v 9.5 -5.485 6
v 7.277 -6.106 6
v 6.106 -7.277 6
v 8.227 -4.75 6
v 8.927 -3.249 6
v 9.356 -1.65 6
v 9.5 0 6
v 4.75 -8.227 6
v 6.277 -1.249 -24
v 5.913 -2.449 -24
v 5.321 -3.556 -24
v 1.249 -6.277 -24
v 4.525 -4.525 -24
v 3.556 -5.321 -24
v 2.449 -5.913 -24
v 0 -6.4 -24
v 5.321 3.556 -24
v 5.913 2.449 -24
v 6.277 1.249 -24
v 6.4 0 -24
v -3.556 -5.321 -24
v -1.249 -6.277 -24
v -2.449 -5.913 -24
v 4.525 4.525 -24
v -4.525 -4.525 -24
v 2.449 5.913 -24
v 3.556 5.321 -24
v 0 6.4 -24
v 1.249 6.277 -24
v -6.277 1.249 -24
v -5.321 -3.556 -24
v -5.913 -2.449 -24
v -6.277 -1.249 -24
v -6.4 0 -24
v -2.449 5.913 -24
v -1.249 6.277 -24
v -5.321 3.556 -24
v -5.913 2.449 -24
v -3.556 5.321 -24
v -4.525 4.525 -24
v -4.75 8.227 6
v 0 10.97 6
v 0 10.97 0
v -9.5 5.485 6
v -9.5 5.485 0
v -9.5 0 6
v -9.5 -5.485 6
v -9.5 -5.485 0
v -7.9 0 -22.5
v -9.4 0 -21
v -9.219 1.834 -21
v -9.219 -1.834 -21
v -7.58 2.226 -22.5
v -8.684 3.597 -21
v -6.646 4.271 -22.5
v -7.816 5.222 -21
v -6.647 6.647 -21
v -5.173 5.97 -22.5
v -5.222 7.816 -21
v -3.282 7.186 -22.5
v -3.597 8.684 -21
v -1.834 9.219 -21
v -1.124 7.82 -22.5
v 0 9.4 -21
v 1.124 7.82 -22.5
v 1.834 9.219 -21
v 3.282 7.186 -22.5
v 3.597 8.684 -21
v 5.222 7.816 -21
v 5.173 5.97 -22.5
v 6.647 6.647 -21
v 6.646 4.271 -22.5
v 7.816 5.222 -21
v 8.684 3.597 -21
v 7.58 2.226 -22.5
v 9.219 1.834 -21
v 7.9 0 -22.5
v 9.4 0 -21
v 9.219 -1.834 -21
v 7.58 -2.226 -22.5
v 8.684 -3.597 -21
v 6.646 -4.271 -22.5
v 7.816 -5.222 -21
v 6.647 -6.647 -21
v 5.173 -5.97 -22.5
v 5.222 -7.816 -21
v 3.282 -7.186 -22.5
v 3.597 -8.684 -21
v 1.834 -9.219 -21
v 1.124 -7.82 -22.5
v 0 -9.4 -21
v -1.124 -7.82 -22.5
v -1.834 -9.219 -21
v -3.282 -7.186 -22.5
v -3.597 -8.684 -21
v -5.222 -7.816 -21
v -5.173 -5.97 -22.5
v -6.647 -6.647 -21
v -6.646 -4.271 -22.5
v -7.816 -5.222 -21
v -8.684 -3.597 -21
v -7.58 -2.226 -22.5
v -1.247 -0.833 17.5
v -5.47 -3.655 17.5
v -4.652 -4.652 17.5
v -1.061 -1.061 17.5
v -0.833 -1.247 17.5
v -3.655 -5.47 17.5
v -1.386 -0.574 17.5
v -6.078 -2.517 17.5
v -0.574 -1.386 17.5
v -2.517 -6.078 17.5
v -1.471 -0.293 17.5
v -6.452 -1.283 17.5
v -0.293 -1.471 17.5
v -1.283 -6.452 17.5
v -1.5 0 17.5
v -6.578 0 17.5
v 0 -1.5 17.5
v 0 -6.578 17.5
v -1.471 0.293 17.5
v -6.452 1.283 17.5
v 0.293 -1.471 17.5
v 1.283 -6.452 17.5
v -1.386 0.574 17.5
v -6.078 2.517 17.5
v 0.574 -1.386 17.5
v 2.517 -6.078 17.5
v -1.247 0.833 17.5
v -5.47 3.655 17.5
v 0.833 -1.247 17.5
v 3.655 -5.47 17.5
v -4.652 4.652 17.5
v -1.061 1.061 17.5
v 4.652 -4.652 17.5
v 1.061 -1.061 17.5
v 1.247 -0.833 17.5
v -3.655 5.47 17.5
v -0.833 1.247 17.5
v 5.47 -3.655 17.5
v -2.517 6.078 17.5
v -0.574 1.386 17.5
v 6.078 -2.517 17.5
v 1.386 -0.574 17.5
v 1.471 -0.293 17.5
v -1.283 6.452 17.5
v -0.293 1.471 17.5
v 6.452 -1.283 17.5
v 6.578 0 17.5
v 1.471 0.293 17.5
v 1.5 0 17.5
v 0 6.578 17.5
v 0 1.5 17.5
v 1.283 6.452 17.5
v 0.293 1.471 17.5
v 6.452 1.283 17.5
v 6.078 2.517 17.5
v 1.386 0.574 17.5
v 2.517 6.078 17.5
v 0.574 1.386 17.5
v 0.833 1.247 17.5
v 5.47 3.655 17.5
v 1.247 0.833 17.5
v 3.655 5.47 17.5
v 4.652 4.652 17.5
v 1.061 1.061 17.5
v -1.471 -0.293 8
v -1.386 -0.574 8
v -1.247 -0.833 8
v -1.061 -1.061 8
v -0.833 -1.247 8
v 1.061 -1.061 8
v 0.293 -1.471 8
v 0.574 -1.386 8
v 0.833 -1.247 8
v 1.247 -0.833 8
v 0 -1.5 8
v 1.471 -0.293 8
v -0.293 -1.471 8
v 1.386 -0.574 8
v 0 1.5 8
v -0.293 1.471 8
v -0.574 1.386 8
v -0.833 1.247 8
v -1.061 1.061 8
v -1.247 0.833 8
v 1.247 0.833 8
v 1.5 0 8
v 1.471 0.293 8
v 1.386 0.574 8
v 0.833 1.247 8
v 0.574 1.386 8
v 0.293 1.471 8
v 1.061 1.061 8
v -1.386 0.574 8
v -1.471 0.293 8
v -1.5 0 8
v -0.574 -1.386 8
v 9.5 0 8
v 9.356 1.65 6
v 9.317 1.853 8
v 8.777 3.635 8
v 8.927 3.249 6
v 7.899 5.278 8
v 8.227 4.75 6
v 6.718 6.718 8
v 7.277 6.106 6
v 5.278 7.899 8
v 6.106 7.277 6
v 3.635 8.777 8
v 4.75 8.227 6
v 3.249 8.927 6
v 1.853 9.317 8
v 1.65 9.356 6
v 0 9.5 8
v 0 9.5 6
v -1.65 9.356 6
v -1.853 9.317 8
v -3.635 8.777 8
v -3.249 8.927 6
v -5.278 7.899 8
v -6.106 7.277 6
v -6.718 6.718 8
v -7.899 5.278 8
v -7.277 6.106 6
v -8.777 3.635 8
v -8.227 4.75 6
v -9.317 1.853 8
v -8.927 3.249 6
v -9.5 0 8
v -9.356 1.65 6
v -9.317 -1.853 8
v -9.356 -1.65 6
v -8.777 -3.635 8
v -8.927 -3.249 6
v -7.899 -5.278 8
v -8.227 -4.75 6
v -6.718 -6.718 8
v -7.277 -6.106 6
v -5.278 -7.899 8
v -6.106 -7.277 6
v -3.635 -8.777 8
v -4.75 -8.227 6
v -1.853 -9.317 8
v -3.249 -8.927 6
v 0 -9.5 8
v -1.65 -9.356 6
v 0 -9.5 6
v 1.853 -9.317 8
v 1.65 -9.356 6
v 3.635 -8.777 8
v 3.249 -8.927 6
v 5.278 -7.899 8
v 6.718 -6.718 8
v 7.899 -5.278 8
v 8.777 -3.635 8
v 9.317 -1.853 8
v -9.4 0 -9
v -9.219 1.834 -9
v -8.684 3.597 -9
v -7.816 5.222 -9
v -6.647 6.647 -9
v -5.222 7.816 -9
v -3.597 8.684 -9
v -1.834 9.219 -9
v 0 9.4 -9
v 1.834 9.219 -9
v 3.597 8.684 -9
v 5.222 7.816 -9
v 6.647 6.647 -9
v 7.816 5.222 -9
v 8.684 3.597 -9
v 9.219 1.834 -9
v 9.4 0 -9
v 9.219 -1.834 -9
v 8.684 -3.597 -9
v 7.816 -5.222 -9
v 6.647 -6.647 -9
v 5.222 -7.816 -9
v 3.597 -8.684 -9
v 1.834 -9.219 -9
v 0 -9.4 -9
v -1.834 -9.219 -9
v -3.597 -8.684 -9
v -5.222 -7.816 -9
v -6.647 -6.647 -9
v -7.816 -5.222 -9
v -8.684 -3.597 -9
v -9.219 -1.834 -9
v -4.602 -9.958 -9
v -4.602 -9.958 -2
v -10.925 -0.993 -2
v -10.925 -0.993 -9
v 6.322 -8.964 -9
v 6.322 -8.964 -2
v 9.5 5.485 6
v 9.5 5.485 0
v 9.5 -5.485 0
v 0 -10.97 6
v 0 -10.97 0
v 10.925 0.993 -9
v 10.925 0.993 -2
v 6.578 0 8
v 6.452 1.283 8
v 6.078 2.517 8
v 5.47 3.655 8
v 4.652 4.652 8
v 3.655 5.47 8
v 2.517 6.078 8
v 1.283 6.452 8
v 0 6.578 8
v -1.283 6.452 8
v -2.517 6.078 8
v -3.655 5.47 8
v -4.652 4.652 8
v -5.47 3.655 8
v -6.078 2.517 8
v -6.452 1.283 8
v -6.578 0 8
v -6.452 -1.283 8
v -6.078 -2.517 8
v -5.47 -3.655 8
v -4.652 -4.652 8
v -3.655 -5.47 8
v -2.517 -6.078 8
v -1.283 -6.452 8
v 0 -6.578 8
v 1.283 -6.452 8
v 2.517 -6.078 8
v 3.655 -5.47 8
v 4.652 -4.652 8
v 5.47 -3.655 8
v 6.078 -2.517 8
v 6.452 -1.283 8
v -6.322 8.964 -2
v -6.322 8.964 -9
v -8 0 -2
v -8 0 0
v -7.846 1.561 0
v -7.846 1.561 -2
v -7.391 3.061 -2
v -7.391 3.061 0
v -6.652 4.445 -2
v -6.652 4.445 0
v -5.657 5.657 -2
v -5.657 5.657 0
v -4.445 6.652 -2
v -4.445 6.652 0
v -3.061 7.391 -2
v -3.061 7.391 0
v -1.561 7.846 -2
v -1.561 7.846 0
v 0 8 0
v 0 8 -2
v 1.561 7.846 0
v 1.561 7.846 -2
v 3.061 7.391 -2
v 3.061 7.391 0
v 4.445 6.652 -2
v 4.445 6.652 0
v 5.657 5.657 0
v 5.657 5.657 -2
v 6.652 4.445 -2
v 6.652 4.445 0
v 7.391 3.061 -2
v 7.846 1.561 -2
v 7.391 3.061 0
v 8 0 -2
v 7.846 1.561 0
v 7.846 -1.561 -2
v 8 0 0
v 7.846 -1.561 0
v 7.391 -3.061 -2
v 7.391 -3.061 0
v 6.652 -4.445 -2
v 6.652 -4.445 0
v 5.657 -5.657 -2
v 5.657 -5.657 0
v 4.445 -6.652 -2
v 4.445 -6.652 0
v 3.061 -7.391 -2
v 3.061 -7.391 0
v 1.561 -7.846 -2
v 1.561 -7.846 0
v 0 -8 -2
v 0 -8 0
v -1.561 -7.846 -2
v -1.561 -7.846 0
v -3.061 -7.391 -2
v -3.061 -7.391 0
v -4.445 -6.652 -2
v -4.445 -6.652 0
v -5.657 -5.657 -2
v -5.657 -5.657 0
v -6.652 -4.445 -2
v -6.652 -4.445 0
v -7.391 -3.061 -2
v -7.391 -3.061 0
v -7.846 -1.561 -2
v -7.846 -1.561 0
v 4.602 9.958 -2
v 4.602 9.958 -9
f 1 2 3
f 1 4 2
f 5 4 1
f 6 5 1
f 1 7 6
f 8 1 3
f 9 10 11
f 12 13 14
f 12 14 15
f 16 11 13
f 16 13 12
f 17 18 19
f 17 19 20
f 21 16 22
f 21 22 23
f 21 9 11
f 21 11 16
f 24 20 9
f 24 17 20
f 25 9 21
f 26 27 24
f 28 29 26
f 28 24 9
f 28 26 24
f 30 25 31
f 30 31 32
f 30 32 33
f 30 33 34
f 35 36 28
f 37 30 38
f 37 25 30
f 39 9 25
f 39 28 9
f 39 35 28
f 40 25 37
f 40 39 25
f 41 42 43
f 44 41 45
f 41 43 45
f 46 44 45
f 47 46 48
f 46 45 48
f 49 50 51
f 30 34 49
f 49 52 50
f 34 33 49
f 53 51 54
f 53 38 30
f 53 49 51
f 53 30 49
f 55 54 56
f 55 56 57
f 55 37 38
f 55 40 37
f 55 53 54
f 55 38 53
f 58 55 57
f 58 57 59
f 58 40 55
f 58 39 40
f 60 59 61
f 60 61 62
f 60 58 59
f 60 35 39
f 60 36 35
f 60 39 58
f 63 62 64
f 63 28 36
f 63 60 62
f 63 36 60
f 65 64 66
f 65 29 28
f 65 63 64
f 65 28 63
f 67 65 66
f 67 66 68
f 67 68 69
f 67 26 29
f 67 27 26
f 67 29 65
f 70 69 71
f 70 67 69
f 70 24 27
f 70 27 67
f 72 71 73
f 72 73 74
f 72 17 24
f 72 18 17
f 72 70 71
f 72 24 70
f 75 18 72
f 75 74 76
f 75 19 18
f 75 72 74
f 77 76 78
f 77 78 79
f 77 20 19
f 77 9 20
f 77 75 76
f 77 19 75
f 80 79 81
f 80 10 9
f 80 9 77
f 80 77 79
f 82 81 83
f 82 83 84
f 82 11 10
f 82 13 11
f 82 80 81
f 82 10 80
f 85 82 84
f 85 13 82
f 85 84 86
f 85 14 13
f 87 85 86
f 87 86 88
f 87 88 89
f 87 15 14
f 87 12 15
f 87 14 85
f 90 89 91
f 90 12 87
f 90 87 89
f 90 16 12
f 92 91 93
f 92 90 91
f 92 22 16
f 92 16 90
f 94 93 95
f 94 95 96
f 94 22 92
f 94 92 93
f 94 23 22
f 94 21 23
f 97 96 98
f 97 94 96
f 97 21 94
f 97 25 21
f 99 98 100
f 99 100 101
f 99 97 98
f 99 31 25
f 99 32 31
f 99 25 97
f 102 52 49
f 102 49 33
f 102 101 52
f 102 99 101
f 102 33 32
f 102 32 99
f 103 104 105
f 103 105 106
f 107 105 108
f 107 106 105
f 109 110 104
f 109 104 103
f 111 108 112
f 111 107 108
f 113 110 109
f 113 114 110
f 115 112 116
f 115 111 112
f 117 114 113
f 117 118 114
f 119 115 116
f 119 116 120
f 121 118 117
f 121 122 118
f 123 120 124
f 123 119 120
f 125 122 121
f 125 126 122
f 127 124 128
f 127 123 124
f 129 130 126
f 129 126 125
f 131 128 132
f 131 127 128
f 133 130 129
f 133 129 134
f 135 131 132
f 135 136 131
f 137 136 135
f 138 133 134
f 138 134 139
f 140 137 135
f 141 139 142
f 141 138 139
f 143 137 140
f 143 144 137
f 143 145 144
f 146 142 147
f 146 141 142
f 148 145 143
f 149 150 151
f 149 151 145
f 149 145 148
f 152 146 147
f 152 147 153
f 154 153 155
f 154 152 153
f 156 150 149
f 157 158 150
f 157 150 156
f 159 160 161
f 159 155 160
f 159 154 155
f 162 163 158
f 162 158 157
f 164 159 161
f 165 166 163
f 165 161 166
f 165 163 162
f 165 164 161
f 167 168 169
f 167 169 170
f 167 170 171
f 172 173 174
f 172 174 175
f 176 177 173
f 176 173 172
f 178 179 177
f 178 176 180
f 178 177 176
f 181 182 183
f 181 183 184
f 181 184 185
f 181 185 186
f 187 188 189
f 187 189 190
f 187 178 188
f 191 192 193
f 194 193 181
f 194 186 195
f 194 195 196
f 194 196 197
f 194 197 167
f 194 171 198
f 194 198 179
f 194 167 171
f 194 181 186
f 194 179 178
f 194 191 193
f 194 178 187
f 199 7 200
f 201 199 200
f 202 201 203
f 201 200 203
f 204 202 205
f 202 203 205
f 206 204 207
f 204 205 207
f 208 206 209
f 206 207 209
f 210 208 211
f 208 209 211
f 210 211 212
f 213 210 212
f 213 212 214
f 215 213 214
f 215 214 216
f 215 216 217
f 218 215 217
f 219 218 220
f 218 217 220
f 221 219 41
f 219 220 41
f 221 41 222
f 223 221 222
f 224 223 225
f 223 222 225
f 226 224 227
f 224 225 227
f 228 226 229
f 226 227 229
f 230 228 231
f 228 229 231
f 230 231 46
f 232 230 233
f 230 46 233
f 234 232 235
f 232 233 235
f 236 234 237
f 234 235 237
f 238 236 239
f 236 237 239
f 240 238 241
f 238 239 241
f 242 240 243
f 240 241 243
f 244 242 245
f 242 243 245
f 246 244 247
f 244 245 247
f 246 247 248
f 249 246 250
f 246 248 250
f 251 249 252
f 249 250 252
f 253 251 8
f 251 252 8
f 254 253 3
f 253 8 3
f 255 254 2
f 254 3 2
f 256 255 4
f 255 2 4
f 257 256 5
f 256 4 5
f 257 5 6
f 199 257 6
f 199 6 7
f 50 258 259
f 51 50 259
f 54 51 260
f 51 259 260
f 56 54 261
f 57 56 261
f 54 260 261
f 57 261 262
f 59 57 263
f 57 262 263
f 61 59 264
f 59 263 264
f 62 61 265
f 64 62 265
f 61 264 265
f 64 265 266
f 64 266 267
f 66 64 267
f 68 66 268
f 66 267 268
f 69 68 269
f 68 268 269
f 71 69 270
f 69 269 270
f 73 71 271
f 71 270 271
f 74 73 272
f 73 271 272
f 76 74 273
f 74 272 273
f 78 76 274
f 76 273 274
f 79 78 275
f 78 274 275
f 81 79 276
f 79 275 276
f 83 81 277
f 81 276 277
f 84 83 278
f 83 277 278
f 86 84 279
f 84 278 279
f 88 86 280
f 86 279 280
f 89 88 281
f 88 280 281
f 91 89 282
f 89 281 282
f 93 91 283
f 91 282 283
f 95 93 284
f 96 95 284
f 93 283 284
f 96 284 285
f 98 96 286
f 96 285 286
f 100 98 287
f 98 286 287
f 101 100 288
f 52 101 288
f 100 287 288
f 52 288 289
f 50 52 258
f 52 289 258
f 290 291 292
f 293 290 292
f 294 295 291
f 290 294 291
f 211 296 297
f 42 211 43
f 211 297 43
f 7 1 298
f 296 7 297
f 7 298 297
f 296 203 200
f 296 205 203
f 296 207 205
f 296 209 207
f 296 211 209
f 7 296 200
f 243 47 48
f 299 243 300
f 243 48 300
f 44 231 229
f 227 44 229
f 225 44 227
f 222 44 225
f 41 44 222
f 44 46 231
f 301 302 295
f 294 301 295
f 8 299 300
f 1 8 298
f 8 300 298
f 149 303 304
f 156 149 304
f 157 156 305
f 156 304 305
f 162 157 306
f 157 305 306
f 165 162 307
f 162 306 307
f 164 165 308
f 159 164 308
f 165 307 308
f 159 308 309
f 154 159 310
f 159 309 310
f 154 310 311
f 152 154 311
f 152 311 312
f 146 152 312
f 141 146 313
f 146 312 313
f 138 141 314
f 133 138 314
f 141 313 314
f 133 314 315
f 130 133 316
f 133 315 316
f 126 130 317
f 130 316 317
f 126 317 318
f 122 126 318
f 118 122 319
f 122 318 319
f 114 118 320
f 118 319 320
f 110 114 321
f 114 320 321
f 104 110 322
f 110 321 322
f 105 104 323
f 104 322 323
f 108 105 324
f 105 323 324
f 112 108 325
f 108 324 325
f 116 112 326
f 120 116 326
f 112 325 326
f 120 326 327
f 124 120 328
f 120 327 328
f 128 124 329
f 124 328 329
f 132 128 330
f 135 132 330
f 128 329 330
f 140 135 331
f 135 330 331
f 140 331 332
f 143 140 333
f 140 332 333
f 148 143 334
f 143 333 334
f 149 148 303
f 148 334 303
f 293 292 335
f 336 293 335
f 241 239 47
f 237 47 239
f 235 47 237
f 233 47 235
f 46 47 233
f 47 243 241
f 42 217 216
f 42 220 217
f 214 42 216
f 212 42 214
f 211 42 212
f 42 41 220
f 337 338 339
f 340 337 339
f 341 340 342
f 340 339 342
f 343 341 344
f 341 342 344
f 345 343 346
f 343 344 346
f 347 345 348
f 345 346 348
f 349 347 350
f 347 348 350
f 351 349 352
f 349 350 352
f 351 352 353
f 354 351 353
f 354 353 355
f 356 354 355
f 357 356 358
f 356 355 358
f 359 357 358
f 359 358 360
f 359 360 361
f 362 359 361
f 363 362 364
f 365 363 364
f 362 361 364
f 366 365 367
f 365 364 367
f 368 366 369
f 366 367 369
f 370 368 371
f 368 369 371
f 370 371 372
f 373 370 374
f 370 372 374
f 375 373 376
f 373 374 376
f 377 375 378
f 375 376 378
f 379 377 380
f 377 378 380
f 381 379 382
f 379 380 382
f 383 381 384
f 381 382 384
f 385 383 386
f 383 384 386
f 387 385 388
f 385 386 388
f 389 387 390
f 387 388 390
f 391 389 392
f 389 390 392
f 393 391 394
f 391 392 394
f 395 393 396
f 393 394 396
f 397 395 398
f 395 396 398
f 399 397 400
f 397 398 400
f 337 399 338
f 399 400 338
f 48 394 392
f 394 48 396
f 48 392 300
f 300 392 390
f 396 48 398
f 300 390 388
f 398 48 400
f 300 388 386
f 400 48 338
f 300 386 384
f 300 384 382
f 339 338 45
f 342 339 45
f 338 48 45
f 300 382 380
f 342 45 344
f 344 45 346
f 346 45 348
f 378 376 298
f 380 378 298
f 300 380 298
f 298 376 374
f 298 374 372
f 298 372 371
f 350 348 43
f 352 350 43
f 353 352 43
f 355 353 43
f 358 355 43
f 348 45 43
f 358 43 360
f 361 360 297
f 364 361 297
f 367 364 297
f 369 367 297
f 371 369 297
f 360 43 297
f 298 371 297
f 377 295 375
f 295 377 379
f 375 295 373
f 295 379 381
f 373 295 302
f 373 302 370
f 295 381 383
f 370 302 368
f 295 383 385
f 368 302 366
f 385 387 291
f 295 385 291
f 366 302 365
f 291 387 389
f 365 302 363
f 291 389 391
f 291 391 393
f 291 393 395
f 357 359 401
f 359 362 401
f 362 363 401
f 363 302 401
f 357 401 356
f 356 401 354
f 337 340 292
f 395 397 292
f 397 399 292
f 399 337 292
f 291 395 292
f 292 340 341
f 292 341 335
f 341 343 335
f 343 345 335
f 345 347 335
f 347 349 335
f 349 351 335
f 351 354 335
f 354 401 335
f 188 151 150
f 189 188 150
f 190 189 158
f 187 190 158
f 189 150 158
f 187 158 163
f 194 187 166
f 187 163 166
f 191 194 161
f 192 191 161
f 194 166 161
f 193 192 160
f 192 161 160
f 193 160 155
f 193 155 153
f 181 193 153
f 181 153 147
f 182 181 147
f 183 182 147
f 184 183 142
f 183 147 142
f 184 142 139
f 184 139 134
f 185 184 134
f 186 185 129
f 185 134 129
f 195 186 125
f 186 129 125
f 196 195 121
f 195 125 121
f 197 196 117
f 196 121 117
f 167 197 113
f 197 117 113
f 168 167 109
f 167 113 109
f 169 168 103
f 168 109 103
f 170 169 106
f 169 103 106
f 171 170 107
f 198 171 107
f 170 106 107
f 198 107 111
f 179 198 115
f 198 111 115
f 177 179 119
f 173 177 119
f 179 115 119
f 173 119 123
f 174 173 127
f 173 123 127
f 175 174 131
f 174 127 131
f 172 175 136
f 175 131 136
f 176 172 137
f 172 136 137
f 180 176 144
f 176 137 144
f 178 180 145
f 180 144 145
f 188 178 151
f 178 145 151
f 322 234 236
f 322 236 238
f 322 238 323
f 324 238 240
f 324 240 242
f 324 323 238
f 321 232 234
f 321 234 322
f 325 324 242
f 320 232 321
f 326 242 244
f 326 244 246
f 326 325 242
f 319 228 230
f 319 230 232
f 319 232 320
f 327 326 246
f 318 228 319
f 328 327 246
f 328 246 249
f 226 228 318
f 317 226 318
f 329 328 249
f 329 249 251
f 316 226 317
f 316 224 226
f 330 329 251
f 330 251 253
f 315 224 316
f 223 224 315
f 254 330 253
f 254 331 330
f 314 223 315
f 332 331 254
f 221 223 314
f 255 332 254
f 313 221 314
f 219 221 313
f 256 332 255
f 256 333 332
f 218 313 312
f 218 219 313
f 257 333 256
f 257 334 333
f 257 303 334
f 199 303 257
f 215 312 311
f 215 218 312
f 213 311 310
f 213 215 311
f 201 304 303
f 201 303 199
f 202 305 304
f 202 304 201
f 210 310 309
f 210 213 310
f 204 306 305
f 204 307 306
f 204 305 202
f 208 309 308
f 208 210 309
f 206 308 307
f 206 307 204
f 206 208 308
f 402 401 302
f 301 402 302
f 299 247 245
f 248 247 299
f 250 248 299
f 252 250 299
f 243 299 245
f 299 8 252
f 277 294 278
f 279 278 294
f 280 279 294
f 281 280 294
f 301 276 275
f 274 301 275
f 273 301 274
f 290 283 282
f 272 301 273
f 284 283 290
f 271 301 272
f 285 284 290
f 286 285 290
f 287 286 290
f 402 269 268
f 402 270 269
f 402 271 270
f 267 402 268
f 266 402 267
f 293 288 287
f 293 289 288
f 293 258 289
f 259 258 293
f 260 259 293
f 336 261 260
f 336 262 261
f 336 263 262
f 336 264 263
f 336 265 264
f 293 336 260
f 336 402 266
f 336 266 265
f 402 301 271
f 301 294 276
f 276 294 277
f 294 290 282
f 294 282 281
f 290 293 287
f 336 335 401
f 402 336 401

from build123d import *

# Parameters (mm, degrees)
BASE_EXTRUDE_DEPTH  = 6
SKETCH2_R           = 9.5
BOSS_EXTRUDE1_DEPTH = 2
SKETCH3_R           = 6.5785
BOSS_EXTRUDE2_DEPTH = 9.5
SKETCH4_R           = 1.5
CUT_EXTRUDE1_DEPTH  = 9.5
SKETCH5_R           = 8
BOSS_EXTRUDE3_DEPTH = 2
BOSS_EXTRUDE4_DEPTH = 7
SKETCH8_R           = 9.4
BOSS_EXTRUDE5_DEPTH = 15
CHAMFER1_SIZE       = 3


with BuildPart() as part:
    # Sketch1 → Base-Extrude (new body)
    with BuildSketch(Plane.XY):
        Polygon((0, 10.969655115), (-9.5, 5.484827557), (-9.5, -5.484827557), (0, -10.969655115), (9.5, -5.484827557), (9.5, 5.484827557), align=None)
    extrude(amount=BASE_EXTRUDE_DEPTH)

    # Sketch2 → Boss-Extrude1 (add)
    with BuildSketch(Plane.XY.offset(6)):
        Circle(SKETCH2_R)
    extrude(amount=BOSS_EXTRUDE1_DEPTH)

    # Sketch3 → Boss-Extrude2 (add)
    with BuildSketch(Plane.XY.offset(8)):
        Circle(SKETCH3_R)
    extrude(amount=BOSS_EXTRUDE2_DEPTH)

    # Sketch4 → Cut-Extrude1 (cut)
    with BuildSketch(Plane.XY.offset(17.5)):
        Circle(SKETCH4_R)
    extrude(amount=-CUT_EXTRUDE1_DEPTH, mode=Mode.SUBTRACT)

    # Sketch5 → Boss-Extrude3 (add)
    with BuildSketch(Plane(origin=(0, 0, 0), x_dir=(-1, 0, 0), z_dir=(0, 0, -1))):
        Circle(SKETCH5_R)
    extrude(amount=BOSS_EXTRUDE3_DEPTH)

    # Sketch7 → Boss-Extrude4 (add)
    with BuildSketch(Plane(origin=(0, 0, -2), x_dir=(-1, 0, 0), z_dir=(0, 0, -1))):
        Polygon((10.924605006, -0.99314591), (6.32239209, 8.964412507), (-4.602212916, 9.957558416), (-10.924605006, 0.99314591), (-6.32239209, -8.964412507), (4.602212916, -9.957558416), align=None)
    extrude(amount=BOSS_EXTRUDE4_DEPTH)

    # Sketch8 → Boss-Extrude5 (add)
    with BuildSketch(Plane(origin=(0, 0, -9), x_dir=(-1, 0, 0), z_dir=(0, 0, -1))):
        Circle(SKETCH8_R)
    extrude(amount=BOSS_EXTRUDE5_DEPTH)

    # Chamfer1
    chamfer1_edges = [part.edges().sort_by_distance(p)[0] for p in [
        (9.4, 0, -24),
    ]]
    chamfer(chamfer1_edges, length=CHAMFER1_SIZE)


solid = part.part
